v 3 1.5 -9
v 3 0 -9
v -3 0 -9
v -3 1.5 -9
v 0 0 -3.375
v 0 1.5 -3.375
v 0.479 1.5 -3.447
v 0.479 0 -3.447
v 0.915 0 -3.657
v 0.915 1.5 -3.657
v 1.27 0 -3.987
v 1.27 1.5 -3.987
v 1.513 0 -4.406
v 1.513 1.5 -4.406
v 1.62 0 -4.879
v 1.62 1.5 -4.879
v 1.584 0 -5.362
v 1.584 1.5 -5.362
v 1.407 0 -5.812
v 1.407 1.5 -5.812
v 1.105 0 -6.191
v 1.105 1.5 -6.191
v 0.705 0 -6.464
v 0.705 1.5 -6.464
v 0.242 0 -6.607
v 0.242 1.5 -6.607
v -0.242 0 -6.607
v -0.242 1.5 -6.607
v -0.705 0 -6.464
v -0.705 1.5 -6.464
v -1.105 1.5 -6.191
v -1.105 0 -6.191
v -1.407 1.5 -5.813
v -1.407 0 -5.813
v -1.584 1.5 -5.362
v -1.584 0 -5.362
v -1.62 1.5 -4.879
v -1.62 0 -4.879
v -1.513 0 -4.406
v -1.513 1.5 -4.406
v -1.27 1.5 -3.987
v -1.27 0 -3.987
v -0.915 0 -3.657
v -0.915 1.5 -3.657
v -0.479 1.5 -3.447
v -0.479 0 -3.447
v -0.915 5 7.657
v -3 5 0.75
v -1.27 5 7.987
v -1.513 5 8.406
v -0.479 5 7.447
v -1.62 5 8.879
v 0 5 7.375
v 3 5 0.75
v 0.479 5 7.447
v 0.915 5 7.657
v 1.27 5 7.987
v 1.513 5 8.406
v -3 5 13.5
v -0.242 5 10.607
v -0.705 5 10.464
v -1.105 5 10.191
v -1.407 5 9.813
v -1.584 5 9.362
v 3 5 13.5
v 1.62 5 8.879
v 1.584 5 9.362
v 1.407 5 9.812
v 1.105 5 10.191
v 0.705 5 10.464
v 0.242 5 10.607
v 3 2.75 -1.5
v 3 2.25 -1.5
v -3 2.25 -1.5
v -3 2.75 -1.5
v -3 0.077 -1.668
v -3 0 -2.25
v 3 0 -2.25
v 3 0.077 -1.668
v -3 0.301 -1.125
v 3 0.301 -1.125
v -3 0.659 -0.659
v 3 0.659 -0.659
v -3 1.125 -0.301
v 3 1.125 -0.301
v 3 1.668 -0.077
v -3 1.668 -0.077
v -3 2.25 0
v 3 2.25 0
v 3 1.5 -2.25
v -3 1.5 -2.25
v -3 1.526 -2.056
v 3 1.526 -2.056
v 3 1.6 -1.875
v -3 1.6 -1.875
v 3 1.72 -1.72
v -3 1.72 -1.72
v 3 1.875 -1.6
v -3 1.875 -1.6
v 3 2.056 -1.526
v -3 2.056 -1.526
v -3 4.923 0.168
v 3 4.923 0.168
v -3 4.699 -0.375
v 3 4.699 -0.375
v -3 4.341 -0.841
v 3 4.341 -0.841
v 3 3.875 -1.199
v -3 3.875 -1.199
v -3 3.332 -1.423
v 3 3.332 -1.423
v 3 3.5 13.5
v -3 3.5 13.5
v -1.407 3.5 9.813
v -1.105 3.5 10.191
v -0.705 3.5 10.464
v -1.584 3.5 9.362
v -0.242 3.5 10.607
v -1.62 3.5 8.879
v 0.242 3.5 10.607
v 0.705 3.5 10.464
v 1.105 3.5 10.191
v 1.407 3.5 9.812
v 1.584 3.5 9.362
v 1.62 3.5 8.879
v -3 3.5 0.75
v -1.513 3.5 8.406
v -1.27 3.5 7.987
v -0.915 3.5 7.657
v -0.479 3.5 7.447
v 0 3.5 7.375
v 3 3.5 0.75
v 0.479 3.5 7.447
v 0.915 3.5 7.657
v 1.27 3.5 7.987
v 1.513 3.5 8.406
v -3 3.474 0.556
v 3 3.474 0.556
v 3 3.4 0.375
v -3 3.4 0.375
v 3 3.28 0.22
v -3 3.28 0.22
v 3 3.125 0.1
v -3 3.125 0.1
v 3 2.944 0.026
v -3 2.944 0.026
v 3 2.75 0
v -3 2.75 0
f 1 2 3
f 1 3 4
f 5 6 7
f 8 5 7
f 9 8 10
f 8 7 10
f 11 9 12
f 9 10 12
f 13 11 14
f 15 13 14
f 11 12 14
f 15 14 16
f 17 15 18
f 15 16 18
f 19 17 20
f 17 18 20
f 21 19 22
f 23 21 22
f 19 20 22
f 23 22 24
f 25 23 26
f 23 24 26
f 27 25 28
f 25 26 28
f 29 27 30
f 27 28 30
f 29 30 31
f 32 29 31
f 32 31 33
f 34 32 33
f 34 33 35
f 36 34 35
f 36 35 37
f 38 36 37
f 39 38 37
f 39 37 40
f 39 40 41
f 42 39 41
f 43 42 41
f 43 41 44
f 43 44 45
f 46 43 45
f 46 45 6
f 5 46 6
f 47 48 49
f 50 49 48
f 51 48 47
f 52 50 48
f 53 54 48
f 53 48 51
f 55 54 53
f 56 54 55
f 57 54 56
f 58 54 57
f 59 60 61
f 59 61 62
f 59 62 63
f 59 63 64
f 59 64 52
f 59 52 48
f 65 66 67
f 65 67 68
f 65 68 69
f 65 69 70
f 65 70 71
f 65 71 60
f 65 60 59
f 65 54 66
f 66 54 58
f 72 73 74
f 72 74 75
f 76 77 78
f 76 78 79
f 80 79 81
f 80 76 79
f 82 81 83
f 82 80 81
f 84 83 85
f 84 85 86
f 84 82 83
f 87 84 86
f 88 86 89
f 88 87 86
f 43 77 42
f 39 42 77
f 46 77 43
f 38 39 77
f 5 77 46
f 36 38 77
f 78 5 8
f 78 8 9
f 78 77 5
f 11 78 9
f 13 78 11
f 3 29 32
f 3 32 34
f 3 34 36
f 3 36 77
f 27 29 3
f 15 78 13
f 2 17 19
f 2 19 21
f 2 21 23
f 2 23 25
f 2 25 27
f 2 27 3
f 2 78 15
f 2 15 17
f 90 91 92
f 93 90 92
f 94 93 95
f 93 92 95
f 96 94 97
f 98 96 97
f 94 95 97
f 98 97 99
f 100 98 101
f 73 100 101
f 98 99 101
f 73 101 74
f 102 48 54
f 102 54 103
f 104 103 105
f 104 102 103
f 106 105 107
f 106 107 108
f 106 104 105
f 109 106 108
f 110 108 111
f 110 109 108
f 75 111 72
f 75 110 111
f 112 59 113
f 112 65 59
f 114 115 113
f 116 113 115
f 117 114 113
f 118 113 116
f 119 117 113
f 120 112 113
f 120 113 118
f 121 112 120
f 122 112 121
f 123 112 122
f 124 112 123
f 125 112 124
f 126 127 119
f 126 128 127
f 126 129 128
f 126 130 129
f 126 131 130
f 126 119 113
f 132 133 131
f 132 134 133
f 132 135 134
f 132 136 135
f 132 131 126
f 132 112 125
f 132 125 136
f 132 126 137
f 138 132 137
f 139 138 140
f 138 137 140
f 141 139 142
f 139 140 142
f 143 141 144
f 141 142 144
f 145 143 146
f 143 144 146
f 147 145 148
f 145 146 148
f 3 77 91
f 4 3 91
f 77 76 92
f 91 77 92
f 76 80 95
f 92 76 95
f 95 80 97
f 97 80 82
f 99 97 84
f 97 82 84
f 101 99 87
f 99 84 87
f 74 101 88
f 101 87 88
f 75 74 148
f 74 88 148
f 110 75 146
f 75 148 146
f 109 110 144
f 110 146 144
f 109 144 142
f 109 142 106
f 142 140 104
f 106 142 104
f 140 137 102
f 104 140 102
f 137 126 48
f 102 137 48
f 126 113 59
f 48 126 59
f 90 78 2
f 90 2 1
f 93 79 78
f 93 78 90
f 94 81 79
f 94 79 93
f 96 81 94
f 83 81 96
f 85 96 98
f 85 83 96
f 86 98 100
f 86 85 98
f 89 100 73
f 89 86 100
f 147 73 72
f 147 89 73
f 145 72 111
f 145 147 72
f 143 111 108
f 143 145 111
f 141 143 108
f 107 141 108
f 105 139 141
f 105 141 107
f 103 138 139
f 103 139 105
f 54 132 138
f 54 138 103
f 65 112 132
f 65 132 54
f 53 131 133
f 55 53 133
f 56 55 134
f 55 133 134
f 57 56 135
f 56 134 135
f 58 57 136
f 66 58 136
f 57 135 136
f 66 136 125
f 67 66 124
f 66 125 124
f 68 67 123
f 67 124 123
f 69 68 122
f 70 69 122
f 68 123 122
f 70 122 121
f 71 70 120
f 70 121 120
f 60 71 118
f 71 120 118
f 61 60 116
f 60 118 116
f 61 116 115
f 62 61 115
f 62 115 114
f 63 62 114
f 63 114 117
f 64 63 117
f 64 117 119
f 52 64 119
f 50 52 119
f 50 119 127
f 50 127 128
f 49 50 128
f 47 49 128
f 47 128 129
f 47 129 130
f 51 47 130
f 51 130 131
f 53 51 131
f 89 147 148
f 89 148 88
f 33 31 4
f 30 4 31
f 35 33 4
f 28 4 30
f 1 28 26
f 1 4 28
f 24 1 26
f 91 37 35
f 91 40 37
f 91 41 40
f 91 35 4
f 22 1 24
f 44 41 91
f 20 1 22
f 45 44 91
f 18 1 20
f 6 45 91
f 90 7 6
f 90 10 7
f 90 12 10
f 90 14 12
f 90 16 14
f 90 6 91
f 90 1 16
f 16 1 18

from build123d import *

# Parameters (mm, degrees)
BOSS_EXTRUDE1_DEPTH    = 3
SKETCH2_R              = 1.625
CUT_EXTRUDE1_DEPTH     = 13.854960132
SKETCH3_R              = 1.625
CUT_EXTRUDE2_DEPTH     = 16.215124055
CONVERT_SOLID1_START   = -3
CONVERT_SOLID1_DEPTH   = 6
CONVERT_SOLID1_2_DEPTH = 6


# Read off the part's stored shape, not the designer's step: Convert-Solid1
with BuildPart() as part:
    # Sketch1 → Boss-Extrude1 (new, symmetric)
    with BuildSketch(Plane(origin=(0, 0, 0), x_dir=(0, 0, -1), z_dir=(1, 0, 0))):
        Polygon((0, 3.5), (0, 0), (9, 0), (9, 1.5), (1.5, 1.5), (1.5, 5), (-13.5, 5), (-13.5, 3.5), align=None)
    extrude(amount=BOSS_EXTRUDE1_DEPTH, both=True)

    # Sketch2 → Cut-Extrude1 (cut, through all)
    with BuildSketch(Plane(origin=(0, 1.5, 1.5), x_dir=(1, 0, 0), z_dir=(0, 1, 0))):
        with Locations(Location((0, 6.5, 0), (0, 0, 270))):
            Circle(SKETCH2_R)
    extrude(amount=-CUT_EXTRUDE1_DEPTH, mode=Mode.SUBTRACT)

    # Sketch3 → Cut-Extrude2 (cut, through all)
    with BuildSketch(Plane(origin=(0, 3.5, -1), x_dir=(1, 0, 0), z_dir=(0, -1, 0))):
        with Locations(Location((0, 10, 0), (0, 0, 270))):
            Circle(SKETCH3_R)
    extrude(amount=-CUT_EXTRUDE2_DEPTH, mode=Mode.SUBTRACT)

    # Convert-Solid1 outline → Convert-Solid1 (cut)
    with BuildSketch(Plane.YZ.offset(CONVERT_SOLID1_START)):
        with BuildLine():
            ThreePointArc((0, -2.25), (0.659009742, -0.659009742), (2.25, 0))
            Line((2.25, 0), (0, 0))
            Line((0, 0), (0, -2.25))
        make_face()
        with BuildLine():
            ThreePointArc((5, 0.75), (4.340990258, -0.840990258), (2.75, -1.5))
            Line((2.75, -1.5), (5, -1.5))
            Line((5, -1.5), (5, 0.75))
        make_face()
    extrude(amount=CONVERT_SOLID1_DEPTH, mode=Mode.SUBTRACT)

    # Convert-Solid1 2 outline → Convert-Solid1 2 (add)
    with BuildSketch(Plane.YZ.offset(CONVERT_SOLID1_START)):
        with BuildLine():
            ThreePointArc((3.5, 0.75), (3.280330086, 0.219669914), (2.75, 0))
            Line((2.75, 0), (3.5, 0))
            Line((3.5, 0), (3.5, 0.75))
        make_face()
        with BuildLine():
            ThreePointArc((1.5, -2.25), (1.719669914, -1.719669914), (2.25, -1.5))
            Line((2.25, -1.5), (1.5, -1.5))
            Line((1.5, -1.5), (1.5, -2.25))
        make_face()
    extrude(amount=CONVERT_SOLID1_2_DEPTH)


solid = part.part
